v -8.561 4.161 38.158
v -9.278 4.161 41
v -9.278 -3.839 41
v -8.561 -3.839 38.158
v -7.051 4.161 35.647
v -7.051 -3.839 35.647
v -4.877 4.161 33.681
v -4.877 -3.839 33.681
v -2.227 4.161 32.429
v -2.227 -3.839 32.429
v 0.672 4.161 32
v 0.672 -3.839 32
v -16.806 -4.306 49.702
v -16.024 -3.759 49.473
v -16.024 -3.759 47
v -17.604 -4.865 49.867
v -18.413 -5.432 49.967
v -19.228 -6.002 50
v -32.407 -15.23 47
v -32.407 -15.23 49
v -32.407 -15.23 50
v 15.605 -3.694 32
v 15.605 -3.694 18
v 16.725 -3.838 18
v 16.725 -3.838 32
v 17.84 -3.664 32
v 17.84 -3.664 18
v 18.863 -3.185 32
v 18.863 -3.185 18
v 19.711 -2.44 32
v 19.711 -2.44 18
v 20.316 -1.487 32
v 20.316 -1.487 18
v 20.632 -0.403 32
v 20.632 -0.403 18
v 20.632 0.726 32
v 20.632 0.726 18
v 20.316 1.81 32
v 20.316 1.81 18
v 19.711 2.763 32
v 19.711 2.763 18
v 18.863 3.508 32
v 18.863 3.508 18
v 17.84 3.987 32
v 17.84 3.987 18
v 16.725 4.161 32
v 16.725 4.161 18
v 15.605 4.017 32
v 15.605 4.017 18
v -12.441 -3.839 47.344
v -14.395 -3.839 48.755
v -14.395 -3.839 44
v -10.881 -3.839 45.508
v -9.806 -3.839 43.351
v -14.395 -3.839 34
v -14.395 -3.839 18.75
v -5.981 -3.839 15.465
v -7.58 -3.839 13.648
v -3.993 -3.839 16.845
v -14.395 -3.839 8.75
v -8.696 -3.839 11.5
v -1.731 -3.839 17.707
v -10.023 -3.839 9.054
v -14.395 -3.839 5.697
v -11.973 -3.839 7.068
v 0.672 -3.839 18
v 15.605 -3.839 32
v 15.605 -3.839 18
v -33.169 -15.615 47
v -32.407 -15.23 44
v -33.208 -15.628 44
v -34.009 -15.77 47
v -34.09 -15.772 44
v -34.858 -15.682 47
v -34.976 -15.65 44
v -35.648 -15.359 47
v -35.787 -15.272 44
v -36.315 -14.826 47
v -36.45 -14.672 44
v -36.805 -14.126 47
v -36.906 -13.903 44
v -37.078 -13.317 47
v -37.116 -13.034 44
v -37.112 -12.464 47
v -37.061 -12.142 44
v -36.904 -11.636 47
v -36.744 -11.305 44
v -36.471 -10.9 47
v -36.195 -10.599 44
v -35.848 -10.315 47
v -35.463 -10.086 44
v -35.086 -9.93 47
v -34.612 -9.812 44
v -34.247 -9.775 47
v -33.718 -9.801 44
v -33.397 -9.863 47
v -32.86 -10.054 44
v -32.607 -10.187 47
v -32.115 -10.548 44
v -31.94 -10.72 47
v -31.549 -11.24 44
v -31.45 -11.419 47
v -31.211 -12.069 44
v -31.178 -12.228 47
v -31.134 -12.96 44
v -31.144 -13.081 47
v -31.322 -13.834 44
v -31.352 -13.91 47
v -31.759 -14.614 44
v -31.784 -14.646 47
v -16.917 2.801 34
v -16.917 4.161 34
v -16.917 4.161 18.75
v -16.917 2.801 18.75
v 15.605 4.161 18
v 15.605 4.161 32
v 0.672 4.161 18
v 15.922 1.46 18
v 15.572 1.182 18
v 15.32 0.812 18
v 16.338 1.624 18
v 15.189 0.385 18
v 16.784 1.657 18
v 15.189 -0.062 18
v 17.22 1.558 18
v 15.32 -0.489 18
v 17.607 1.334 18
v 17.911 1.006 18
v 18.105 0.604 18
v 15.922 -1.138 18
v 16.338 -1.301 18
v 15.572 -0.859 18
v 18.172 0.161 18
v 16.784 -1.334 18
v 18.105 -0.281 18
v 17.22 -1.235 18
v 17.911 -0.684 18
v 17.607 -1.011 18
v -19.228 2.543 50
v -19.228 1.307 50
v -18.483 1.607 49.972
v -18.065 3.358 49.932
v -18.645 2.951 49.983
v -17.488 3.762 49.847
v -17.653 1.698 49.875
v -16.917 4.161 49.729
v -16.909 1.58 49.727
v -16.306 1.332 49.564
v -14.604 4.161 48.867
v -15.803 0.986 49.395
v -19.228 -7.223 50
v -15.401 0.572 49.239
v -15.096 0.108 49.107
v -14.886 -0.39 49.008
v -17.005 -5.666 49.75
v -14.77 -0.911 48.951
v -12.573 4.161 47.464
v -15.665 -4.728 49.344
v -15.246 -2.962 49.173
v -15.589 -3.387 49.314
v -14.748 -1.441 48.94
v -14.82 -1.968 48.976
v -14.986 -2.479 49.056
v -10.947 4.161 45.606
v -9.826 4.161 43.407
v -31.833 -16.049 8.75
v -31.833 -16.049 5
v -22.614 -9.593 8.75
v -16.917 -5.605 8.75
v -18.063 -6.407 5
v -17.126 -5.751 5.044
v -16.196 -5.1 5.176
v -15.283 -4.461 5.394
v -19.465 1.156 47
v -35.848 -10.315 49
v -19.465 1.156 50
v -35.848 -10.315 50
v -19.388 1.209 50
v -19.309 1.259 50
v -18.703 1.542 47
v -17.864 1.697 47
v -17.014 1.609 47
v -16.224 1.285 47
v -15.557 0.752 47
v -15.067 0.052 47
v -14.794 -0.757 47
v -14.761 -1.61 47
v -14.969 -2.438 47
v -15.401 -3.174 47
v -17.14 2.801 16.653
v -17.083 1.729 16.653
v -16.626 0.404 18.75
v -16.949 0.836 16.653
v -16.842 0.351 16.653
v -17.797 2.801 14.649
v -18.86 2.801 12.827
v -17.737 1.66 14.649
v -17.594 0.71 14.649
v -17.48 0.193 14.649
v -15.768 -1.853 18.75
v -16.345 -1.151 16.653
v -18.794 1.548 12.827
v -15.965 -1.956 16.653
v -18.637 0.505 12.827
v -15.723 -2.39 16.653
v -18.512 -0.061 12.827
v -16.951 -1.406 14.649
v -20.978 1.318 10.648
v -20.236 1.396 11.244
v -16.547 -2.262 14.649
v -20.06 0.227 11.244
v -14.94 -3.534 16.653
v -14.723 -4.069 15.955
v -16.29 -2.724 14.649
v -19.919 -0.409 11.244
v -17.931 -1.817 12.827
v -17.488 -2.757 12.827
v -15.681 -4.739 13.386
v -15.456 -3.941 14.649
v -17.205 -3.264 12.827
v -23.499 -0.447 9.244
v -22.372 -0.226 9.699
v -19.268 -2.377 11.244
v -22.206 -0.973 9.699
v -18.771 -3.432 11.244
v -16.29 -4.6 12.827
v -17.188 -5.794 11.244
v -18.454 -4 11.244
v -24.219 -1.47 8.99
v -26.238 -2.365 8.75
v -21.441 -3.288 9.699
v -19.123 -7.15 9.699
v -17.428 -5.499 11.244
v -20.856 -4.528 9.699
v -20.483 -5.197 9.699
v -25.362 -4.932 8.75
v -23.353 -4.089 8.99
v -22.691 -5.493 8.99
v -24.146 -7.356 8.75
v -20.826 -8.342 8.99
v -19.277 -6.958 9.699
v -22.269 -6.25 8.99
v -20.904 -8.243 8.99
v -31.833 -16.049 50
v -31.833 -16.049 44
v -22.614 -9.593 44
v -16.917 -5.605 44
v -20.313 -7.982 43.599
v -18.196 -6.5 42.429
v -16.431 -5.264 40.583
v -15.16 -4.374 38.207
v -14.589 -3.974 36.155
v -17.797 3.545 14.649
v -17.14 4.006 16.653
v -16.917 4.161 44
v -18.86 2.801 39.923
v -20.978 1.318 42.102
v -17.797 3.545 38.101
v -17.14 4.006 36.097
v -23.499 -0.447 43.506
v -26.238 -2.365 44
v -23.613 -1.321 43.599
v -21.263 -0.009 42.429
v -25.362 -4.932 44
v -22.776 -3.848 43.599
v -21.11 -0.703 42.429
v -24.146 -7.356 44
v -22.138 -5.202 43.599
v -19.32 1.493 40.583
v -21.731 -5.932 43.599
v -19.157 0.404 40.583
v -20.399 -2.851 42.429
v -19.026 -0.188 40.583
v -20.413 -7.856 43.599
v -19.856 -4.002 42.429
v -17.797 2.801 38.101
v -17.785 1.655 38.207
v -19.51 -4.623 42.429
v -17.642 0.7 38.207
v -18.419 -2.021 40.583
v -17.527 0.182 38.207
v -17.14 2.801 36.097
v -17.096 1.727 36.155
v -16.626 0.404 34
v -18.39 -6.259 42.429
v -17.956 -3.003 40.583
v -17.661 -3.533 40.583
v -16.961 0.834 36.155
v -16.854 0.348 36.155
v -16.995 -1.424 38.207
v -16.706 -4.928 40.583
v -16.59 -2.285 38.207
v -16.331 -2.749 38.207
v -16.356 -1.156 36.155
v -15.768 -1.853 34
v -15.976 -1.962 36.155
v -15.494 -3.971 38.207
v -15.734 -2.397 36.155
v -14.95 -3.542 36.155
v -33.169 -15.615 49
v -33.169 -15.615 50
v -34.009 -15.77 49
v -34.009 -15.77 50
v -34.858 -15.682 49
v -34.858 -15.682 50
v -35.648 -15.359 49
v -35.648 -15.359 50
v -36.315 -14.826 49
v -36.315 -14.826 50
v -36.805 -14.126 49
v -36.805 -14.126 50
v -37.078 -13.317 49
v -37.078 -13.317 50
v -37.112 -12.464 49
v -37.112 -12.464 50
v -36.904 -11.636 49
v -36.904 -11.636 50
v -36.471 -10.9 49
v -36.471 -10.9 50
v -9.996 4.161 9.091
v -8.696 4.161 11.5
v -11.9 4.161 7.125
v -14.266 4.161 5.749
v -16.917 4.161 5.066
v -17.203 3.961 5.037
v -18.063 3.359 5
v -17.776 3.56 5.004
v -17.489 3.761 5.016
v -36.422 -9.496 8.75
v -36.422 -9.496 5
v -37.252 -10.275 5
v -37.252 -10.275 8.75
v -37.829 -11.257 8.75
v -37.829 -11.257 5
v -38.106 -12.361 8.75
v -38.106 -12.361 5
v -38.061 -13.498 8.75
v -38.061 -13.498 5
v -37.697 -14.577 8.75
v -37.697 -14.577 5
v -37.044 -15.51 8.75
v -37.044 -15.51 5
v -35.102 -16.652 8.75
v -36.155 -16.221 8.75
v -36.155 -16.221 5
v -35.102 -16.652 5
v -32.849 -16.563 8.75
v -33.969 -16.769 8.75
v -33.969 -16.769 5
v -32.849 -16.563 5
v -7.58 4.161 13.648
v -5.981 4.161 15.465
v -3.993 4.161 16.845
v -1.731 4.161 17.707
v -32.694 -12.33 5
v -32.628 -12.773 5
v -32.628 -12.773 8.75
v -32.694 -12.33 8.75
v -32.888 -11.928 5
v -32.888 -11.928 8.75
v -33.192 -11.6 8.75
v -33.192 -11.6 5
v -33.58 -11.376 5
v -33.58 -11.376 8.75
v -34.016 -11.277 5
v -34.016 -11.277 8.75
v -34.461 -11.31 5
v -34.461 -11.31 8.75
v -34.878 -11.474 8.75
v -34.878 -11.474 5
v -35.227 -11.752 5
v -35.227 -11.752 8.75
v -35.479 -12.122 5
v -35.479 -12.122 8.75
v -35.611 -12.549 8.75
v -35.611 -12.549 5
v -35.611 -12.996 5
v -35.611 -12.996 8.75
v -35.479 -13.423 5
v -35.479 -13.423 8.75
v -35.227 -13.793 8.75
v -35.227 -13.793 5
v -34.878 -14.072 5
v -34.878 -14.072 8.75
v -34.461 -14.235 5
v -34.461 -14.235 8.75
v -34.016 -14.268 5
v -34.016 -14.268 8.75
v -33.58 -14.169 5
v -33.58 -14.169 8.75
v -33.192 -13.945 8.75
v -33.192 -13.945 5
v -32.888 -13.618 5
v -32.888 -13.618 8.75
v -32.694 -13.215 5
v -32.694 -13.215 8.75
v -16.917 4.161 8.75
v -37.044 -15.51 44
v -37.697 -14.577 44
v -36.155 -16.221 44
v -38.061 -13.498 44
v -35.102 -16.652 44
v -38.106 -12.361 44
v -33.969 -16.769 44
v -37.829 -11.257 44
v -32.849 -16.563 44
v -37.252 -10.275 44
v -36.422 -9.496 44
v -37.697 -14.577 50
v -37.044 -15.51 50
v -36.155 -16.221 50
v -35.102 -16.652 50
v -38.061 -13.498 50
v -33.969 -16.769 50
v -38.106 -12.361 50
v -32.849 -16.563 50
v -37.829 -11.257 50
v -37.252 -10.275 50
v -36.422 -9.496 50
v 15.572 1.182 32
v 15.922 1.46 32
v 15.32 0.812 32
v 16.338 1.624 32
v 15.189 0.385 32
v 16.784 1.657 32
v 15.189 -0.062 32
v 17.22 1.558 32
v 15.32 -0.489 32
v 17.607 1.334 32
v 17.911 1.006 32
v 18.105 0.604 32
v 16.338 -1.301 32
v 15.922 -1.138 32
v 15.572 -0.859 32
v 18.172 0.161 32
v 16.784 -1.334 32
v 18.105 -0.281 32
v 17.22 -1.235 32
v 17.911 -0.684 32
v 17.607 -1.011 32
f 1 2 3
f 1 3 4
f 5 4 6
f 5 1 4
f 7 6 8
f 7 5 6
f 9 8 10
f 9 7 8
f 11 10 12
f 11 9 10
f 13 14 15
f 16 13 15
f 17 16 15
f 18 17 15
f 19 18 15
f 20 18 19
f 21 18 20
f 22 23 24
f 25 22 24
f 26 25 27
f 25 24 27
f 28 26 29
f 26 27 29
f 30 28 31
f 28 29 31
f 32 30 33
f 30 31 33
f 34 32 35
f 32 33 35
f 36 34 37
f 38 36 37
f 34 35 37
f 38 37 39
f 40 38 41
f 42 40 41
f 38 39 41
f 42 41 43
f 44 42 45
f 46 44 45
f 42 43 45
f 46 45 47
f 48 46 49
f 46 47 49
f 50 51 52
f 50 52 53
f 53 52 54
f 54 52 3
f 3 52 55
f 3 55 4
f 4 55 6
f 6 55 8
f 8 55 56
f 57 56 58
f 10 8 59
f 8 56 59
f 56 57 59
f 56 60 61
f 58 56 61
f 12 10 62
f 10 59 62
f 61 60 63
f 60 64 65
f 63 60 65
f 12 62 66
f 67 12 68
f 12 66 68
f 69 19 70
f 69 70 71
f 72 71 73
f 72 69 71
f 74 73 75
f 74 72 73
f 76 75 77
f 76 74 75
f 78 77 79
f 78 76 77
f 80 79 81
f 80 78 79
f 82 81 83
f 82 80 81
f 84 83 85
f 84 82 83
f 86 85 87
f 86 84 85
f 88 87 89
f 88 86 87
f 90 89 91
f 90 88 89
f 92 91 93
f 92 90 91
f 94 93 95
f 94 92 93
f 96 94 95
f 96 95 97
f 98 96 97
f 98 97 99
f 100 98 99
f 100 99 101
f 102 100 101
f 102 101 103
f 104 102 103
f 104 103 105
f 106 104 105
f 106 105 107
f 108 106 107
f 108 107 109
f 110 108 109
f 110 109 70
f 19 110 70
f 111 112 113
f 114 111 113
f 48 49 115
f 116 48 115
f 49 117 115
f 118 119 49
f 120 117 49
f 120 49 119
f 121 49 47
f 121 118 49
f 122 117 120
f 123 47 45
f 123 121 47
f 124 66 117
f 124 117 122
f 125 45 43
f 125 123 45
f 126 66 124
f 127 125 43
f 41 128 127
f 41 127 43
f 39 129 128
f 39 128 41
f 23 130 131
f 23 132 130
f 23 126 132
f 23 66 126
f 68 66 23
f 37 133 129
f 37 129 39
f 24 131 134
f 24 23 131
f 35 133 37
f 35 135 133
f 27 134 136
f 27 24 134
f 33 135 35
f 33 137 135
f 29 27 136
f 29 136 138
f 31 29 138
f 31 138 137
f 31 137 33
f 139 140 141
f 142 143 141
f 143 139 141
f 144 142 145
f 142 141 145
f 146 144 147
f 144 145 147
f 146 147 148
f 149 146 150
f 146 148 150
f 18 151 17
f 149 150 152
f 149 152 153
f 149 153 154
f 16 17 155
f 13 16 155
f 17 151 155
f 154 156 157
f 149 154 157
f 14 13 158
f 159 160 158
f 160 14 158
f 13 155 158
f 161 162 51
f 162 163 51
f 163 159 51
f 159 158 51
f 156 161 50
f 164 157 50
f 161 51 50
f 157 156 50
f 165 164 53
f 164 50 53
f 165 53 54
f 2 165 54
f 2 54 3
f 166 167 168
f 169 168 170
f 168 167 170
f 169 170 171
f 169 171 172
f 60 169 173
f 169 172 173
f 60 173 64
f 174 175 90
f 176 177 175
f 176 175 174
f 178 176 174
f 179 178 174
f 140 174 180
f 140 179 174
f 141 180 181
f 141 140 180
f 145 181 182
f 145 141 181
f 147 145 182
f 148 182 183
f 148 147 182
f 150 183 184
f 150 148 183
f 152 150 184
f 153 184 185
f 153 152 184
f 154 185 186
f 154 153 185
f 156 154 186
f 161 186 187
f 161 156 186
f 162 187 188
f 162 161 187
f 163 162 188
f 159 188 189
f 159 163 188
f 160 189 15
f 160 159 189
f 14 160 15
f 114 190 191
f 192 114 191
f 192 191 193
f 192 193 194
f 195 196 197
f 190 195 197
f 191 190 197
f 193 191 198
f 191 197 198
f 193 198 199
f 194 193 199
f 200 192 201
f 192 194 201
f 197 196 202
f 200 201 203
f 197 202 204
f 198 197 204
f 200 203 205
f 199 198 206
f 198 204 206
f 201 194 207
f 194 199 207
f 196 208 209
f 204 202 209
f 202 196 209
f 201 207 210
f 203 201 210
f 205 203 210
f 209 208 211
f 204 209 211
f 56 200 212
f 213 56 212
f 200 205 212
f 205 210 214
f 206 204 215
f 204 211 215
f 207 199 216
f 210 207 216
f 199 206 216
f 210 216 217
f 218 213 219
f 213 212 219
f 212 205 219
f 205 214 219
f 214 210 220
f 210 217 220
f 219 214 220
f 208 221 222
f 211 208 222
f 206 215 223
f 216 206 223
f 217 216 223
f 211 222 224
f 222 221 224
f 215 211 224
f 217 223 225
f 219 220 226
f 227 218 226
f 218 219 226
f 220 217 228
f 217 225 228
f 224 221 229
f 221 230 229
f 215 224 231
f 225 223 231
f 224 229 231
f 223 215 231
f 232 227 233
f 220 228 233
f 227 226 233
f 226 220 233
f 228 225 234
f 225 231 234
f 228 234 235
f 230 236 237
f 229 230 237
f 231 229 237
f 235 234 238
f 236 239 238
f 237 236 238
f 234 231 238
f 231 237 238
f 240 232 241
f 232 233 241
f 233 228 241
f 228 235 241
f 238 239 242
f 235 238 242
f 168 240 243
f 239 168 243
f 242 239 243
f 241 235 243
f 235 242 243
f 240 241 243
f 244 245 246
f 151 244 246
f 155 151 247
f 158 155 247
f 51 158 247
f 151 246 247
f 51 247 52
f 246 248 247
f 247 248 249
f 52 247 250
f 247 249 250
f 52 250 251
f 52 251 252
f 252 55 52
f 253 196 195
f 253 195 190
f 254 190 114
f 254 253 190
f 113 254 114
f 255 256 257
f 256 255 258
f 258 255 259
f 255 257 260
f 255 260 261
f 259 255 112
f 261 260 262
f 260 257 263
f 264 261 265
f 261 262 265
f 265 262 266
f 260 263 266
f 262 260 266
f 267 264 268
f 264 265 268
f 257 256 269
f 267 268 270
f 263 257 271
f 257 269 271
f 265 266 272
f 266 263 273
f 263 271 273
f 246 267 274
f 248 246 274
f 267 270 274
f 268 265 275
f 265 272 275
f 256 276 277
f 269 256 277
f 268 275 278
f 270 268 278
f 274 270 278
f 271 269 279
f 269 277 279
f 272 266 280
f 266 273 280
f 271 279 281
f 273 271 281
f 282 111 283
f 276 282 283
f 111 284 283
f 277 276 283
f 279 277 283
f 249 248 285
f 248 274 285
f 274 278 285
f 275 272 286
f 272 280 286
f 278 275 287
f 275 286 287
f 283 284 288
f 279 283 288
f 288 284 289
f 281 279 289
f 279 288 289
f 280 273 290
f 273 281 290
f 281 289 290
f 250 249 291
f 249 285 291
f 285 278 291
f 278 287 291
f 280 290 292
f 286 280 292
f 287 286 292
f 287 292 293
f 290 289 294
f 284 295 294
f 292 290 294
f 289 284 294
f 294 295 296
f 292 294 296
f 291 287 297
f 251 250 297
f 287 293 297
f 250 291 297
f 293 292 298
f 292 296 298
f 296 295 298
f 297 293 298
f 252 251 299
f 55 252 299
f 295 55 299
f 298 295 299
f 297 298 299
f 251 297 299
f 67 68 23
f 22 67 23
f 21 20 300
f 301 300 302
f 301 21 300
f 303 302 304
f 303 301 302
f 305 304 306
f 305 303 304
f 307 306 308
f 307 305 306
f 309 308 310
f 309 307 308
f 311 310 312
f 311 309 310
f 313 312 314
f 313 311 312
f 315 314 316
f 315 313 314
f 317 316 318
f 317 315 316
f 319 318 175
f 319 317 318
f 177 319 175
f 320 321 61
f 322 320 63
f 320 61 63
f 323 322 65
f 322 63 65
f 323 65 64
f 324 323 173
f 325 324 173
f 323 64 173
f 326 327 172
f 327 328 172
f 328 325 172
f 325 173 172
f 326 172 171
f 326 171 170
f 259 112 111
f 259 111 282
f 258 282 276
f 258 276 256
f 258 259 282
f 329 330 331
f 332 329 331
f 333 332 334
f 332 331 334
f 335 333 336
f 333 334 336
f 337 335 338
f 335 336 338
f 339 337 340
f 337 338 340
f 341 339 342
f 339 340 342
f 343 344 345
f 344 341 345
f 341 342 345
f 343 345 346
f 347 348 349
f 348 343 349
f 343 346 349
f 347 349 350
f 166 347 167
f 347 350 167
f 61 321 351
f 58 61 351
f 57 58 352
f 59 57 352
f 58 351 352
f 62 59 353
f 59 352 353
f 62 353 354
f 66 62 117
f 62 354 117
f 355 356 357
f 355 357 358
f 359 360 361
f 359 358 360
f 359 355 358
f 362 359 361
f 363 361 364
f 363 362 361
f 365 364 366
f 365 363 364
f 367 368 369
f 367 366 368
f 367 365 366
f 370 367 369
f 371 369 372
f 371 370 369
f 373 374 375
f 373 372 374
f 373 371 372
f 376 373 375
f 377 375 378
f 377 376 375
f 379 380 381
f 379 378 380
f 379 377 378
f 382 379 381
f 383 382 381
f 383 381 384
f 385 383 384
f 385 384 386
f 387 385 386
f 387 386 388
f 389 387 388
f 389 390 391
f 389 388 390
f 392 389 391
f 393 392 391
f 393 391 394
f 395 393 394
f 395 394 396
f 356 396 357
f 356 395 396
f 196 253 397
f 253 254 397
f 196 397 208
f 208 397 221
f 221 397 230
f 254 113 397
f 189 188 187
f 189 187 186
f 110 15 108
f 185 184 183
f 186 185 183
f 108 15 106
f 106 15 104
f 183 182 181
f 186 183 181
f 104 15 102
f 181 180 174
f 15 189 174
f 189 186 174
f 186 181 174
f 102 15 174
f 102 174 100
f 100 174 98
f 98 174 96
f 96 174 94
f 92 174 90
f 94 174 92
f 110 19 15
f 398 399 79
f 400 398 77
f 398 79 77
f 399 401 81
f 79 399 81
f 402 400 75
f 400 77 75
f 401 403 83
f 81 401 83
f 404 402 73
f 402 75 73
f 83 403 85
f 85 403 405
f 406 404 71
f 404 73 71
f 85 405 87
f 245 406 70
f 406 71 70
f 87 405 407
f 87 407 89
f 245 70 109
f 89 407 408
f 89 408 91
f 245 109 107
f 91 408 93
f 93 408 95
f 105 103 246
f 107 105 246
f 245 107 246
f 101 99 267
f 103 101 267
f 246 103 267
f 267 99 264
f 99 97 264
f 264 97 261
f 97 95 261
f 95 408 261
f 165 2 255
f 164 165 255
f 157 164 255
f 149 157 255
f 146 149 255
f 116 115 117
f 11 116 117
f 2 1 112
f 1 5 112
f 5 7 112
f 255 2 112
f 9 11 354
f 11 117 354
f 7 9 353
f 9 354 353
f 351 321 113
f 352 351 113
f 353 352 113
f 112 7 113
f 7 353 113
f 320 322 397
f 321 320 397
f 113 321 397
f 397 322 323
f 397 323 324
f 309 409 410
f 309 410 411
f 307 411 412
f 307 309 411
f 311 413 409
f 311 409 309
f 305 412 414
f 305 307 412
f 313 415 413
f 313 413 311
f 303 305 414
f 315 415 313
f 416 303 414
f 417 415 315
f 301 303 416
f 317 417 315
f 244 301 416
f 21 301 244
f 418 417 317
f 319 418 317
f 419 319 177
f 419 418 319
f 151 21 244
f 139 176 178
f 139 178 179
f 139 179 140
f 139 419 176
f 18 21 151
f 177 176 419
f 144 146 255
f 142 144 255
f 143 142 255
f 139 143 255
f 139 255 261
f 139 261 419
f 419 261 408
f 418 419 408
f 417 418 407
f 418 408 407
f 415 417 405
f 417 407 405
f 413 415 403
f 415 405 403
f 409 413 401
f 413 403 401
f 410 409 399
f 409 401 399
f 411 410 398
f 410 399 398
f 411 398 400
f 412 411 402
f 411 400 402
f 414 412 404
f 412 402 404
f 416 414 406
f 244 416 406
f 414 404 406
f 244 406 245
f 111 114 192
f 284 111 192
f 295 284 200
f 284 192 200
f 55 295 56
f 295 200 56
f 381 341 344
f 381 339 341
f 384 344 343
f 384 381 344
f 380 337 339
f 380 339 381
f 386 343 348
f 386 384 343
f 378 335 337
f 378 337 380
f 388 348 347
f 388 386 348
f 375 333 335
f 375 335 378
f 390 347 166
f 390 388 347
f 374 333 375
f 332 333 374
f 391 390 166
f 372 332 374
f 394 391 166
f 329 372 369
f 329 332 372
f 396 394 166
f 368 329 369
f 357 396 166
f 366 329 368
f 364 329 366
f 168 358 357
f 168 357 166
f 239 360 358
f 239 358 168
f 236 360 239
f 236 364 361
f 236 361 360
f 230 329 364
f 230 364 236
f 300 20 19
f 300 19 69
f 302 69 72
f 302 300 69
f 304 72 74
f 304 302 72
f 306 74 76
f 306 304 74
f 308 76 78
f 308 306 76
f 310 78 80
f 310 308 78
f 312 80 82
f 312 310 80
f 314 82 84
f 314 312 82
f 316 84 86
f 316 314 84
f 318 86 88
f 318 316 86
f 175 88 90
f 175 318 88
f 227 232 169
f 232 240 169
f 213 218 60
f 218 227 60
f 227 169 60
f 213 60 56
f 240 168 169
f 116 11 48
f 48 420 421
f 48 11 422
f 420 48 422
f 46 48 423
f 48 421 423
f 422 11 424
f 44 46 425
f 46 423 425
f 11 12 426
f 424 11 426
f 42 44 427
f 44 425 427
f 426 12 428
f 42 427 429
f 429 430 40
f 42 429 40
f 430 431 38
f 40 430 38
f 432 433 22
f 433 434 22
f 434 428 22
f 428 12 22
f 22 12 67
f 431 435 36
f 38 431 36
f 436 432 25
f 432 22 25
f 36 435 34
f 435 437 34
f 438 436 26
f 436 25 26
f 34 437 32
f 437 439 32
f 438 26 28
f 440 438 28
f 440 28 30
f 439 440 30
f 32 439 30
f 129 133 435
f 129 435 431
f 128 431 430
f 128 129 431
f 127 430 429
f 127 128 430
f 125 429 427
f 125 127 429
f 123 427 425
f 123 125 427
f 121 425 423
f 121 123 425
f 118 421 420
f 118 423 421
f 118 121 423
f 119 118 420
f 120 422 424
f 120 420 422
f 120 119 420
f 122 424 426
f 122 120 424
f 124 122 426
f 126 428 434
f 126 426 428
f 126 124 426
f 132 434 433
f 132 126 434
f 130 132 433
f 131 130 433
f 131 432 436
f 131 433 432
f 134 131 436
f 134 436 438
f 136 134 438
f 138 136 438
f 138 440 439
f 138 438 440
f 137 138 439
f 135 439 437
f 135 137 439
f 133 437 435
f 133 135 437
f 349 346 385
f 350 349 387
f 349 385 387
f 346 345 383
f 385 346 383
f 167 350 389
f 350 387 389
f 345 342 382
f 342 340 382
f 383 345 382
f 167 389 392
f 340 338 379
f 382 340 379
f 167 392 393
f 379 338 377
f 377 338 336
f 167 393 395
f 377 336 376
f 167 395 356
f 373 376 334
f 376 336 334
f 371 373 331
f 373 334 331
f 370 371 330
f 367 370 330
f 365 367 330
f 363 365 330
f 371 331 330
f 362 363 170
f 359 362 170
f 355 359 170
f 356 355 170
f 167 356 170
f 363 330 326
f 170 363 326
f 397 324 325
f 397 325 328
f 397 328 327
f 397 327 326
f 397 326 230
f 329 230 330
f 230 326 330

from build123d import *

# Parameters (mm, degrees)
SKETCH_1_R           = 1.5
EXTRUDE_2_DEPTH      = 50
SKETCH_14_W          = 30
SKETCH_14_H          = 18
CUT_EXTRUDE_6_DEPTH  = 65.195102675
SKETCH_15_W          = 22.4475894
SKETCH_15_H          = 16.25
CUT_EXTRUDE_7_DEPTH  = 30
SKETCH_17_W          = 25.359818697
SKETCH_17_H          = 19
CUT_EXTRUDE_9_DEPTH  = 30
FILLET_8_R           = 10
SKETCH_19_W          = 34.027540403
SKETCH_19_H          = 5
CUT_EXTRUDE_11_DEPTH = 65.759348106
FILLET_9_R           = 10
FILLET_11_R          = 10
FILLET_12_R          = 10
CUT_EXTRUDE_12_DEPTH = 3
CUT_EXTRUDE_START    = -5
SKETCH_21_R          = 3
CUT_EXTRUDE_13_DEPTH = 5


with BuildPart() as part:
    # 草图1 → 凸台-拉伸2 (new body)
    with BuildSketch(Plane.XY):
        with BuildLine():
            Line((15.60515688, 4.016530447), (15.60515688, 4.161375168))
            Line((15.60515688, 4.161375168), (-16.917233431, 4.161375168))
            Line((-16.917233431, 4.161375168), (-36.422020871, -9.496024029))
            ThreePointArc((-36.422020871, -9.496024029), (-37.404323302, -15.066937951), (-31.83340938, -16.049240383))
            Line((-31.83340938, -16.049240383), (-14.39484312, -3.838624832))
            Line((-14.39484312, -3.838624832), (15.60515688, -3.838624832))
            Line((15.60515688, -3.838624832), (15.60515688, -3.693780111))
            ThreePointArc((15.60515688, -3.693780111), (20.671823547, 0.161375168), (15.60515688, 4.016530447))
        make_face()
        with Locations((-34.127715125, -12.772632206)):
            Circle(SKETCH_1_R, mode=Mode.SUBTRACT)
        with Locations((16.671823547, 0.161375168)):
            Circle(SKETCH_1_R, mode=Mode.SUBTRACT)
    extrude(amount=EXTRUDE_2_DEPTH)

    # 草图14 → 切除-拉伸6 (cut, through all)
    with BuildSketch(Plane.XZ.offset(3.838624832)):
        with Locations((5.671823547, 41)):
            Rectangle(SKETCH_14_W, SKETCH_14_H)
        with Locations((5.671823547, 9)):
            Rectangle(SKETCH_14_W, SKETCH_14_H)
    extrude(amount=-CUT_EXTRUDE_6_DEPTH, mode=Mode.SUBTRACT)

    # 草图15 → 切除-拉伸7 (cut)
    with BuildSketch(Plane(origin=(0, 4.161375168, 0), x_dir=(1, 0, 0), z_dir=(0, 1, 0))):
        with Locations((-28.141028131, -16.875)):
            Rectangle(SKETCH_15_W, SKETCH_15_H)
    extrude(amount=-CUT_EXTRUDE_7_DEPTH, mode=Mode.SUBTRACT)

    # 草图17 → 切除-拉伸9 (cut)
    with BuildSketch(Plane(origin=(0, 4.161375168, 0), x_dir=(1, 0, 0), z_dir=(0, 1, 0))):
        with Locations((-29.59714278, -34.5)):
            Rectangle(SKETCH_17_W, SKETCH_17_H)
    extrude(amount=-CUT_EXTRUDE_9_DEPTH, mode=Mode.SUBTRACT)

    # 圆角8
    # the kernel refuses this fillet: 10 mm, written as the material it takes off along each edge
    with BuildSketch(Plane(origin=(-16.917233431, -5.604821542, 8.75), x_dir=(0.8191520442889905, 0.573576436351048, 0), z_dir=(0, 0, 1))) as fillet_8_piece_1:
        with BuildLine():
            CenterArc((13.012933373, 1.149926903), FILLET_8_R, 145, 41.603203435)
            Line((4.82141293, 6.885691266), (0, 0))
            Line((0, 0), (3.079269995, 0))
        make_face()
    extrude(amount=35.25, mode=Mode.SUBTRACT)

    # 草图19 → 切除-拉伸11 (cut, through all)
    with BuildSketch(Plane(origin=(-7.520806183, 10.740824359, 0), x_dir=(0.8191520442889908, 0.5735764363510477, 0), z_dir=(-0.5735764363510477, 0.8191520442889908, 0))):
        with Locations((-22.268098274, -2.5)):
            Rectangle(SKETCH_19_W, SKETCH_19_H)
    extrude(amount=-CUT_EXTRUDE_11_DEPTH, mode=Mode.SUBTRACT)

    # 圆角9
    fillet_9_edges = [part.edges().sort_by_distance(p)[0] for p in [
        (-9.328176453, 0.161375168, 18),
        (-9.328176453, 0.161375168, 32),
    ]]
    fillet(fillet_9_edges, radius=FILLET_9_R)

    # 圆角11
    # the kernel refuses this fillet: 10 mm, written as the material it adds along each edge
    with BuildSketch(Plane(origin=(-16.917233431, 29.161375168, 44), x_dir=(0, 0, -1), z_dir=(0, -1, 0))) as fillet_11_piece_1_section:
        with BuildLine():
            CenterArc((FILLET_11_R, -FILLET_11_R), FILLET_11_R, 90, 90)
            Line((0, -FILLET_11_R), (0, 0))
            Line((0, 0), (FILLET_11_R, 0))
        make_face()
    fillet_11_piece_1 = extrude(amount=26.360319786, mode=Mode.PRIVATE)
    fillet_11_piece_1 = split(fillet_11_piece_1, bisect_by=Plane(origin=(-17.705446038, 3.609462759, 40.498761656), z_dir=(0.5735764363510475, -0.8191520442889908, 0)), keep=Keep.TOP, mode=Mode.PRIVATE)
    add(fillet_11_piece_1)
    with BuildSketch(Plane(origin=(-16.917233431, 29.161375168, 8.75), x_dir=(-1, 0, 0), z_dir=(0, -1, 0))) as fillet_11_piece_2_section:
        with BuildLine():
            CenterArc((FILLET_11_R, -FILLET_11_R), FILLET_11_R, 90, 90)
            Line((0, -FILLET_11_R), (0, 0))
            Line((0, 0), (FILLET_11_R, 0))
        make_face()
    fillet_11_piece_2 = extrude(amount=26.360319786, mode=Mode.PRIVATE)
    fillet_11_piece_2 = split(fillet_11_piece_2, bisect_by=Plane(origin=(-17.705446038, 3.609462759, 12.251238344), z_dir=(0.5735764363510475, -0.8191520442889908, 0)), keep=Keep.TOP, mode=Mode.PRIVATE)
    add(fillet_11_piece_2)
    with BuildSketch(Plane(origin=(-6.917233431, 2.801055382, 8.75), x_dir=(-1, 0, 0), z_dir=(0, 1, 0))) as fillet_11_piece_3_section:
        with BuildLine():
            CenterArc((10 + FILLET_11_R, FILLET_11_R), FILLET_11_R, 180, 90)
            Line((10 + FILLET_11_R, 0), (10, 0))
            Line((10, 0), (10, FILLET_11_R))
        make_face()
    fillet_11_piece_3 = revolve(axis=Axis((-6.917233431, 2.801055382, 8.75), (0, 0, 1)), revolution_arc=184.854944875, mode=Mode.PRIVATE)
    fillet_11_piece_3 = split(fillet_11_piece_3, bisect_by=Plane(origin=(-14.201650521, -3.703349918, 18.374598869), z_dir=(-0.5735764363510472, 0.819152044288991, 0)), keep=Keep.TOP, mode=Mode.PRIVATE)
    fillet_11_piece_3 = split(fillet_11_piece_3, bisect_by=Plane(origin=(-18.790262012, 2.849866436, 18.374598869), z_dir=(0.5735764363510475, -0.8191520442889908, 0)), keep=Keep.TOP, mode=Mode.PRIVATE)
    add(fillet_11_piece_3)
    with BuildSketch(Plane(origin=(-6.917233431, 2.801055382, 44), x_dir=(-1, 0, 0), z_dir=(0, 1, 0))) as fillet_11_piece_4_section:
        with BuildLine():
            CenterArc((10 + FILLET_11_R, -FILLET_11_R), FILLET_11_R, 90, 90)
            Line((10 + FILLET_11_R, 0), (10, 0))
            Line((10, 0), (10, -FILLET_11_R))
        make_face()
    fillet_11_piece_4 = revolve(axis=Axis((-6.917233431, 2.801055382, 44), (0, 0, 1)), revolution_arc=184.854944875, mode=Mode.PRIVATE)
    fillet_11_piece_4 = split(fillet_11_piece_4, bisect_by=Plane(origin=(-14.743190126, -4.082540032, 40.444195091), z_dir=(-0.5735764363510472, 0.819152044288991, 0)), keep=Keep.TOP, mode=Mode.PRIVATE)
    fillet_11_piece_4 = split(fillet_11_piece_4, bisect_by=Plane(origin=(-19.331801617, 2.470676322, 40.444195091), z_dir=(0.5735764363510475, -0.8191520442889908, 0)), keep=Keep.TOP, mode=Mode.PRIVATE)
    add(fillet_11_piece_4)

    # 圆角12
    # the kernel refuses this fillet: 10 mm, written as the material it takes off along each edge
    with BuildSketch(Plane(origin=(-9.328176453, -28.587996687, 50), x_dir=(-1, 0, 0), z_dir=(0, 1, 0))) as fillet_12_piece_1:
        with BuildLine():
            CenterArc((9.899748742, -10), FILLET_12_R, 90, 84.260829523)
            Line((-0.050125629, -9), (-1.045113066, -8.9))
            ThreePointArc((-1.045113066, -8.9), (-1, -8), (-1, 0))
            Line((-1, 0), (0, 1))
            Line((0, 1), (9.899748742, 1))
            Line((9.899748742, 1), (9.899748742, 0))
        make_face()
    extrude(amount=57.498743711, mode=Mode.SUBTRACT)
    with BuildSketch(Plane(origin=(-9.328176453, -25.67610982, 5), x_dir=(-1, 0, 0), z_dir=(0, 1, 0))) as fillet_12_piece_2:
        with BuildLine():
            CenterArc((8.734993995, 10), FILLET_12_R, 200.487315115, 69.512684885)
            Line((-0.632503002, 6.5), (-1.569252702, 6.15))
            ThreePointArc((-1.569252702, 6.15), (-1, 3), (-1, 0))
            Line((-1, 0), (0, -1))
            Line((0, -1), (8.734993995, -1))
            Line((8.734993995, -1), (8.734993995, 0))
        make_face()
    extrude(amount=51.674969976, mode=Mode.SUBTRACT)

    # 草图20 → 切除-拉伸12 (cut)
    with BuildSketch(Plane.XY.offset(50)):
        with BuildLine():
            Line((-35.848444434, -10.315176073), (-19.465403549, 1.156352654))
            ThreePointArc((-19.465403549, 1.156352654), (-15.287218107, 0.41962583), (-16.02394493, -3.758559612))
            Line((-16.02394493, -3.758559612), (-32.406985816, -15.230088339))
            ThreePointArc((-32.406985816, -15.230088339), (-36.585171258, -14.493361515), (-35.848444434, -10.315176073))
        make_face()
    extrude(amount=-CUT_EXTRUDE_12_DEPTH, mode=Mode.SUBTRACT)

    # 草图21 → 切除-拉伸13 (cut)
    with BuildSketch(Plane(origin=(0, 0, 44), x_dir=(-1, 0, 0), z_dir=(0, 0, -1)).offset(CUT_EXTRUDE_START)):
        with Locations(Location((34.127715125, -12.772632206, 0), (0, 0, 235))):
            Circle(SKETCH_21_R)
    extrude(amount=CUT_EXTRUDE_13_DEPTH, mode=Mode.SUBTRACT)


solid = part.part
